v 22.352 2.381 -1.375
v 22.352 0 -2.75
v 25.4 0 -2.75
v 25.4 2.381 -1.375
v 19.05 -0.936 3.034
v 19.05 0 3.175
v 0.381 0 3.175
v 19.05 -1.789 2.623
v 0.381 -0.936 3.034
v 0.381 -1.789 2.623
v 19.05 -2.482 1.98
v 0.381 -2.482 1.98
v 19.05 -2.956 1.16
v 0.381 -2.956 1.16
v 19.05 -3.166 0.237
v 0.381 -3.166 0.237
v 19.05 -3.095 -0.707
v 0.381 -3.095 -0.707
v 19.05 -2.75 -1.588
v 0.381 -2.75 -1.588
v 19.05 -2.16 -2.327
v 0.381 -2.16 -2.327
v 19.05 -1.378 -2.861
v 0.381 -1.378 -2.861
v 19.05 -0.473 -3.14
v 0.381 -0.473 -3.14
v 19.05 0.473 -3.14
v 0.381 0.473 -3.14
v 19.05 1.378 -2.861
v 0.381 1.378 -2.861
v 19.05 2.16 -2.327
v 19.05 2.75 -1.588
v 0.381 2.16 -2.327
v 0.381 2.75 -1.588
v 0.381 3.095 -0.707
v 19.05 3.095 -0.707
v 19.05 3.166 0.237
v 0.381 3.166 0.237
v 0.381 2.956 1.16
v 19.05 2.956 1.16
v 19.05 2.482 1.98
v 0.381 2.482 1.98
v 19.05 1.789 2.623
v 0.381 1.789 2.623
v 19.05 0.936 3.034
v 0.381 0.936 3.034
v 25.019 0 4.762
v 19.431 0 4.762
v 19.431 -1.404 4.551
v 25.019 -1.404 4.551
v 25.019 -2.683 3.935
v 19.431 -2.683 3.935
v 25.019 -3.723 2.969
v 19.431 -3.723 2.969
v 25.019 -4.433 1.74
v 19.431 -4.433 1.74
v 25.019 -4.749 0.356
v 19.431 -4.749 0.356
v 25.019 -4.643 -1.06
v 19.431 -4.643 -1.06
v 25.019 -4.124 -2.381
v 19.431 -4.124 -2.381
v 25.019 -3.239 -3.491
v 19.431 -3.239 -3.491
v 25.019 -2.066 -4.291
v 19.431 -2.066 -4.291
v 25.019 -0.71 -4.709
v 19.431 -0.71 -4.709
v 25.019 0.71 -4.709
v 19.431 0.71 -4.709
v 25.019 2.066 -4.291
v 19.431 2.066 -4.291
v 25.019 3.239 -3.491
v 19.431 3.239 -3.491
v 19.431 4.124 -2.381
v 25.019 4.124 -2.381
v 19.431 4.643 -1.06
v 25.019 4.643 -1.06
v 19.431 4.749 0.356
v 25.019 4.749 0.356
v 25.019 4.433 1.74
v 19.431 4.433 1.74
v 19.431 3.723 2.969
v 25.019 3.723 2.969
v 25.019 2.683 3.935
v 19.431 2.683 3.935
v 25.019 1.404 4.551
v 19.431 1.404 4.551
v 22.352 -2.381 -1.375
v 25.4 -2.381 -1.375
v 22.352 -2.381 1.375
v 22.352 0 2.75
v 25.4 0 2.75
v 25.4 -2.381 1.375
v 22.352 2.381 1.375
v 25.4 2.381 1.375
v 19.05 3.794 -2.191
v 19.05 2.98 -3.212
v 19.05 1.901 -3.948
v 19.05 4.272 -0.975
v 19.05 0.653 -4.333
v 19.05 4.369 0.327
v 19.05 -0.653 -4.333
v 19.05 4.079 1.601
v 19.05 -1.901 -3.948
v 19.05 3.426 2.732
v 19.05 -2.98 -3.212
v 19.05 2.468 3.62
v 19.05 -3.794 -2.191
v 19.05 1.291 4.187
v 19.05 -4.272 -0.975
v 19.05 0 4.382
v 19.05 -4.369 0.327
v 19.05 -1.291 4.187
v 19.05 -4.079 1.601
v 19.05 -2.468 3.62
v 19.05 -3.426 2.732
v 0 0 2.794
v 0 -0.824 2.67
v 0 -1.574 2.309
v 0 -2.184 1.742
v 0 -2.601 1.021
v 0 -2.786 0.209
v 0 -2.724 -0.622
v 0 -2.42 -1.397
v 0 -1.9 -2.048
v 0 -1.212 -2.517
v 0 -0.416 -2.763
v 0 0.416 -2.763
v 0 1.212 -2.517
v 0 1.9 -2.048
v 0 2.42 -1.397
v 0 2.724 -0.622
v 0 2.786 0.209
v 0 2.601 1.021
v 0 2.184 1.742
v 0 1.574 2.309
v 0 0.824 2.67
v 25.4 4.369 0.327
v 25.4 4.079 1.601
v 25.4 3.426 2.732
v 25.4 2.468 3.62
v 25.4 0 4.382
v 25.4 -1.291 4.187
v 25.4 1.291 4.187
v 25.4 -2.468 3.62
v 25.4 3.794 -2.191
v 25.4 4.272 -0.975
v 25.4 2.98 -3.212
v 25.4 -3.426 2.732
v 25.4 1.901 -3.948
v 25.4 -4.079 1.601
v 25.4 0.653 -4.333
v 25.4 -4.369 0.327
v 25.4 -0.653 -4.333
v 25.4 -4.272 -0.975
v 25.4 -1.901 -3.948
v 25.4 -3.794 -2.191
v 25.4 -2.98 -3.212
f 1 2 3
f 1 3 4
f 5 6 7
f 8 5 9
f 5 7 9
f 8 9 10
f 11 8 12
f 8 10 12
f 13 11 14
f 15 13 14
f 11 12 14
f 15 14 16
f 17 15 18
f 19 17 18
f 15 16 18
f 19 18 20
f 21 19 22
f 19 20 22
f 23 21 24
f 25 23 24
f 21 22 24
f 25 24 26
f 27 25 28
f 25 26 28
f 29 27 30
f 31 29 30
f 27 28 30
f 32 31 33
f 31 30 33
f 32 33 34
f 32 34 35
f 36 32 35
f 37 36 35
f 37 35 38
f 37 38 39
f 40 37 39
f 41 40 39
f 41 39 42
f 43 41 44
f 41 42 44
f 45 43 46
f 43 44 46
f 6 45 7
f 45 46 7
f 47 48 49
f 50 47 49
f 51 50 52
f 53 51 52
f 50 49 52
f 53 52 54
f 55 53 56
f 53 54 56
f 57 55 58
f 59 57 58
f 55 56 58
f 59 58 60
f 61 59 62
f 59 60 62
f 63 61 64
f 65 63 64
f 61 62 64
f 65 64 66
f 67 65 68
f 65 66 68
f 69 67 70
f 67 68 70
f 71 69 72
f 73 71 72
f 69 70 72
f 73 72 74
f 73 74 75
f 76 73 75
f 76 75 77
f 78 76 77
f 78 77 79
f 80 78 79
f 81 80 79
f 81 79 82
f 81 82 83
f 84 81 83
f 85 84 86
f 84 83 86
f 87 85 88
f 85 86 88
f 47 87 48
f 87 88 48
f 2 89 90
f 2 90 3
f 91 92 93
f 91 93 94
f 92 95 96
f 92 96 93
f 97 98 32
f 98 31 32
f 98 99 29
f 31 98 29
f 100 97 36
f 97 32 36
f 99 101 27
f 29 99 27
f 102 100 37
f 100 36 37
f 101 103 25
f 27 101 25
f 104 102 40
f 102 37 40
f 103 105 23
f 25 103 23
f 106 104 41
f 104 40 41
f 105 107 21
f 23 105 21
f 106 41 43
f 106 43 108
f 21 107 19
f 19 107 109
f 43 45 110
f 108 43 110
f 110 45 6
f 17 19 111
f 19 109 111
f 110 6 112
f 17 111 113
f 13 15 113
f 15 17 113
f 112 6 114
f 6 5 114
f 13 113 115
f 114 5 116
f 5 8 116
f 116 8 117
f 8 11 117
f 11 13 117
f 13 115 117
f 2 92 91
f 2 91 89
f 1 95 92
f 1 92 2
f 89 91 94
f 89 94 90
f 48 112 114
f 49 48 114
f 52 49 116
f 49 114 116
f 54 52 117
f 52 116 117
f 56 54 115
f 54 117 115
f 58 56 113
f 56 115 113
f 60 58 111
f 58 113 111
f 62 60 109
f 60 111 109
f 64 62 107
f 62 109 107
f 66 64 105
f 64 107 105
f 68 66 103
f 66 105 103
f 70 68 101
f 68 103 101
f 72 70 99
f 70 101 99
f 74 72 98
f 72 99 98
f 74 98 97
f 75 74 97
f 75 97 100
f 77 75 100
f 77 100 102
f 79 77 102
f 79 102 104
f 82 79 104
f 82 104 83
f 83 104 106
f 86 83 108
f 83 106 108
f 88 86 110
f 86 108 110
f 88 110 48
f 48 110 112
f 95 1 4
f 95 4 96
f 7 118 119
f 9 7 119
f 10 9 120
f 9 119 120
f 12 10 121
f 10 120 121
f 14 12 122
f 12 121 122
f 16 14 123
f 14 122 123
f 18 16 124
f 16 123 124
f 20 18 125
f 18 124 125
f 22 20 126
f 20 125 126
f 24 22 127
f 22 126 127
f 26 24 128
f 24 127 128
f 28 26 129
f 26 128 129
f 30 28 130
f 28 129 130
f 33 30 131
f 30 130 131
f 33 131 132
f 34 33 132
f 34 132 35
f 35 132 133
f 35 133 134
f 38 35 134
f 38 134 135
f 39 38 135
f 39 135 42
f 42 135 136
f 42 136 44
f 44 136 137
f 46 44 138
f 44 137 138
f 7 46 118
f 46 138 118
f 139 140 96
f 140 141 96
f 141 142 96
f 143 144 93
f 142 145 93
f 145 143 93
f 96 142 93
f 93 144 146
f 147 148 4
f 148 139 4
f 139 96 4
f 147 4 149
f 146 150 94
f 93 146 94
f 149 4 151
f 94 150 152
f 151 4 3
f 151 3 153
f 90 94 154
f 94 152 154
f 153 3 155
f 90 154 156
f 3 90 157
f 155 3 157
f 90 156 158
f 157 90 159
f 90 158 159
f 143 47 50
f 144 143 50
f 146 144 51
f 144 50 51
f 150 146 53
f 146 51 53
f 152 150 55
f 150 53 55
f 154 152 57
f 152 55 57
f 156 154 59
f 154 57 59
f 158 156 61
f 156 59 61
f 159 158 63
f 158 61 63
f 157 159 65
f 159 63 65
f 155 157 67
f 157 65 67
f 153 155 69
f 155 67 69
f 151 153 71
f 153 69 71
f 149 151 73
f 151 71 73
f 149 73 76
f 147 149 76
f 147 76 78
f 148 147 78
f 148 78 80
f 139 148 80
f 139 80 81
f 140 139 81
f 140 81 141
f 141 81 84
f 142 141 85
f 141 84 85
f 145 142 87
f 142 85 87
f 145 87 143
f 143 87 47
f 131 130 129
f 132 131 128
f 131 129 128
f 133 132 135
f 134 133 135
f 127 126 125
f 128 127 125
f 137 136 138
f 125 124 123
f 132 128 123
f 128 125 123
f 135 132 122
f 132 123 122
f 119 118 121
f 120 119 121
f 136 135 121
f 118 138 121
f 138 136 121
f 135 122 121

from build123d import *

# Parameters (mm, degrees)
HEX_CUT_DEPTH = 3.048
CHAMFER2_SIZE = 0.381


with BuildPart() as part:
    # Base Sketch → Base (revolve)
    with BuildSketch(Plane.XY, mode=Mode.PRIVATE) as base_sk:
        Polygon((0, 0), (25.4, 0), (25.4, 4.7625), (19.05, 4.7625), (19.05, 3.175), (0, 3.175), align=None)
    revolve(base_sk.sketch.rotate(Axis((0, 0, 0), (1, 0, 0)), 90), axis=Axis((0, 0, 0), (1, 0, 0)))

    # Hex Sketch → Hex Cut (cut)
    with BuildSketch(Plane(origin=(25.4, 0, 0), x_dir=(0, 0, -1), z_dir=(1, 0, 0))):
        Polygon((-1.374815329, 2.38125), (-2.749630657, 0), (-1.374815329, -2.38125), (1.374815329, -2.38125), (2.749630657, 0), (1.374815329, 2.38125), align=None)
    extrude(amount=-HEX_CUT_DEPTH, mode=Mode.SUBTRACT)

    # Chamfer2
    chamfer2_edges = [part.edges().sort_by_distance(p)[0] for p in [
        (0, 0, -3.175),
        (19.05, 0, -4.7625),
        (25.4, 0, -4.7625),
    ]]
    chamfer(chamfer2_edges, length=CHAMFER2_SIZE)


solid = part.part
